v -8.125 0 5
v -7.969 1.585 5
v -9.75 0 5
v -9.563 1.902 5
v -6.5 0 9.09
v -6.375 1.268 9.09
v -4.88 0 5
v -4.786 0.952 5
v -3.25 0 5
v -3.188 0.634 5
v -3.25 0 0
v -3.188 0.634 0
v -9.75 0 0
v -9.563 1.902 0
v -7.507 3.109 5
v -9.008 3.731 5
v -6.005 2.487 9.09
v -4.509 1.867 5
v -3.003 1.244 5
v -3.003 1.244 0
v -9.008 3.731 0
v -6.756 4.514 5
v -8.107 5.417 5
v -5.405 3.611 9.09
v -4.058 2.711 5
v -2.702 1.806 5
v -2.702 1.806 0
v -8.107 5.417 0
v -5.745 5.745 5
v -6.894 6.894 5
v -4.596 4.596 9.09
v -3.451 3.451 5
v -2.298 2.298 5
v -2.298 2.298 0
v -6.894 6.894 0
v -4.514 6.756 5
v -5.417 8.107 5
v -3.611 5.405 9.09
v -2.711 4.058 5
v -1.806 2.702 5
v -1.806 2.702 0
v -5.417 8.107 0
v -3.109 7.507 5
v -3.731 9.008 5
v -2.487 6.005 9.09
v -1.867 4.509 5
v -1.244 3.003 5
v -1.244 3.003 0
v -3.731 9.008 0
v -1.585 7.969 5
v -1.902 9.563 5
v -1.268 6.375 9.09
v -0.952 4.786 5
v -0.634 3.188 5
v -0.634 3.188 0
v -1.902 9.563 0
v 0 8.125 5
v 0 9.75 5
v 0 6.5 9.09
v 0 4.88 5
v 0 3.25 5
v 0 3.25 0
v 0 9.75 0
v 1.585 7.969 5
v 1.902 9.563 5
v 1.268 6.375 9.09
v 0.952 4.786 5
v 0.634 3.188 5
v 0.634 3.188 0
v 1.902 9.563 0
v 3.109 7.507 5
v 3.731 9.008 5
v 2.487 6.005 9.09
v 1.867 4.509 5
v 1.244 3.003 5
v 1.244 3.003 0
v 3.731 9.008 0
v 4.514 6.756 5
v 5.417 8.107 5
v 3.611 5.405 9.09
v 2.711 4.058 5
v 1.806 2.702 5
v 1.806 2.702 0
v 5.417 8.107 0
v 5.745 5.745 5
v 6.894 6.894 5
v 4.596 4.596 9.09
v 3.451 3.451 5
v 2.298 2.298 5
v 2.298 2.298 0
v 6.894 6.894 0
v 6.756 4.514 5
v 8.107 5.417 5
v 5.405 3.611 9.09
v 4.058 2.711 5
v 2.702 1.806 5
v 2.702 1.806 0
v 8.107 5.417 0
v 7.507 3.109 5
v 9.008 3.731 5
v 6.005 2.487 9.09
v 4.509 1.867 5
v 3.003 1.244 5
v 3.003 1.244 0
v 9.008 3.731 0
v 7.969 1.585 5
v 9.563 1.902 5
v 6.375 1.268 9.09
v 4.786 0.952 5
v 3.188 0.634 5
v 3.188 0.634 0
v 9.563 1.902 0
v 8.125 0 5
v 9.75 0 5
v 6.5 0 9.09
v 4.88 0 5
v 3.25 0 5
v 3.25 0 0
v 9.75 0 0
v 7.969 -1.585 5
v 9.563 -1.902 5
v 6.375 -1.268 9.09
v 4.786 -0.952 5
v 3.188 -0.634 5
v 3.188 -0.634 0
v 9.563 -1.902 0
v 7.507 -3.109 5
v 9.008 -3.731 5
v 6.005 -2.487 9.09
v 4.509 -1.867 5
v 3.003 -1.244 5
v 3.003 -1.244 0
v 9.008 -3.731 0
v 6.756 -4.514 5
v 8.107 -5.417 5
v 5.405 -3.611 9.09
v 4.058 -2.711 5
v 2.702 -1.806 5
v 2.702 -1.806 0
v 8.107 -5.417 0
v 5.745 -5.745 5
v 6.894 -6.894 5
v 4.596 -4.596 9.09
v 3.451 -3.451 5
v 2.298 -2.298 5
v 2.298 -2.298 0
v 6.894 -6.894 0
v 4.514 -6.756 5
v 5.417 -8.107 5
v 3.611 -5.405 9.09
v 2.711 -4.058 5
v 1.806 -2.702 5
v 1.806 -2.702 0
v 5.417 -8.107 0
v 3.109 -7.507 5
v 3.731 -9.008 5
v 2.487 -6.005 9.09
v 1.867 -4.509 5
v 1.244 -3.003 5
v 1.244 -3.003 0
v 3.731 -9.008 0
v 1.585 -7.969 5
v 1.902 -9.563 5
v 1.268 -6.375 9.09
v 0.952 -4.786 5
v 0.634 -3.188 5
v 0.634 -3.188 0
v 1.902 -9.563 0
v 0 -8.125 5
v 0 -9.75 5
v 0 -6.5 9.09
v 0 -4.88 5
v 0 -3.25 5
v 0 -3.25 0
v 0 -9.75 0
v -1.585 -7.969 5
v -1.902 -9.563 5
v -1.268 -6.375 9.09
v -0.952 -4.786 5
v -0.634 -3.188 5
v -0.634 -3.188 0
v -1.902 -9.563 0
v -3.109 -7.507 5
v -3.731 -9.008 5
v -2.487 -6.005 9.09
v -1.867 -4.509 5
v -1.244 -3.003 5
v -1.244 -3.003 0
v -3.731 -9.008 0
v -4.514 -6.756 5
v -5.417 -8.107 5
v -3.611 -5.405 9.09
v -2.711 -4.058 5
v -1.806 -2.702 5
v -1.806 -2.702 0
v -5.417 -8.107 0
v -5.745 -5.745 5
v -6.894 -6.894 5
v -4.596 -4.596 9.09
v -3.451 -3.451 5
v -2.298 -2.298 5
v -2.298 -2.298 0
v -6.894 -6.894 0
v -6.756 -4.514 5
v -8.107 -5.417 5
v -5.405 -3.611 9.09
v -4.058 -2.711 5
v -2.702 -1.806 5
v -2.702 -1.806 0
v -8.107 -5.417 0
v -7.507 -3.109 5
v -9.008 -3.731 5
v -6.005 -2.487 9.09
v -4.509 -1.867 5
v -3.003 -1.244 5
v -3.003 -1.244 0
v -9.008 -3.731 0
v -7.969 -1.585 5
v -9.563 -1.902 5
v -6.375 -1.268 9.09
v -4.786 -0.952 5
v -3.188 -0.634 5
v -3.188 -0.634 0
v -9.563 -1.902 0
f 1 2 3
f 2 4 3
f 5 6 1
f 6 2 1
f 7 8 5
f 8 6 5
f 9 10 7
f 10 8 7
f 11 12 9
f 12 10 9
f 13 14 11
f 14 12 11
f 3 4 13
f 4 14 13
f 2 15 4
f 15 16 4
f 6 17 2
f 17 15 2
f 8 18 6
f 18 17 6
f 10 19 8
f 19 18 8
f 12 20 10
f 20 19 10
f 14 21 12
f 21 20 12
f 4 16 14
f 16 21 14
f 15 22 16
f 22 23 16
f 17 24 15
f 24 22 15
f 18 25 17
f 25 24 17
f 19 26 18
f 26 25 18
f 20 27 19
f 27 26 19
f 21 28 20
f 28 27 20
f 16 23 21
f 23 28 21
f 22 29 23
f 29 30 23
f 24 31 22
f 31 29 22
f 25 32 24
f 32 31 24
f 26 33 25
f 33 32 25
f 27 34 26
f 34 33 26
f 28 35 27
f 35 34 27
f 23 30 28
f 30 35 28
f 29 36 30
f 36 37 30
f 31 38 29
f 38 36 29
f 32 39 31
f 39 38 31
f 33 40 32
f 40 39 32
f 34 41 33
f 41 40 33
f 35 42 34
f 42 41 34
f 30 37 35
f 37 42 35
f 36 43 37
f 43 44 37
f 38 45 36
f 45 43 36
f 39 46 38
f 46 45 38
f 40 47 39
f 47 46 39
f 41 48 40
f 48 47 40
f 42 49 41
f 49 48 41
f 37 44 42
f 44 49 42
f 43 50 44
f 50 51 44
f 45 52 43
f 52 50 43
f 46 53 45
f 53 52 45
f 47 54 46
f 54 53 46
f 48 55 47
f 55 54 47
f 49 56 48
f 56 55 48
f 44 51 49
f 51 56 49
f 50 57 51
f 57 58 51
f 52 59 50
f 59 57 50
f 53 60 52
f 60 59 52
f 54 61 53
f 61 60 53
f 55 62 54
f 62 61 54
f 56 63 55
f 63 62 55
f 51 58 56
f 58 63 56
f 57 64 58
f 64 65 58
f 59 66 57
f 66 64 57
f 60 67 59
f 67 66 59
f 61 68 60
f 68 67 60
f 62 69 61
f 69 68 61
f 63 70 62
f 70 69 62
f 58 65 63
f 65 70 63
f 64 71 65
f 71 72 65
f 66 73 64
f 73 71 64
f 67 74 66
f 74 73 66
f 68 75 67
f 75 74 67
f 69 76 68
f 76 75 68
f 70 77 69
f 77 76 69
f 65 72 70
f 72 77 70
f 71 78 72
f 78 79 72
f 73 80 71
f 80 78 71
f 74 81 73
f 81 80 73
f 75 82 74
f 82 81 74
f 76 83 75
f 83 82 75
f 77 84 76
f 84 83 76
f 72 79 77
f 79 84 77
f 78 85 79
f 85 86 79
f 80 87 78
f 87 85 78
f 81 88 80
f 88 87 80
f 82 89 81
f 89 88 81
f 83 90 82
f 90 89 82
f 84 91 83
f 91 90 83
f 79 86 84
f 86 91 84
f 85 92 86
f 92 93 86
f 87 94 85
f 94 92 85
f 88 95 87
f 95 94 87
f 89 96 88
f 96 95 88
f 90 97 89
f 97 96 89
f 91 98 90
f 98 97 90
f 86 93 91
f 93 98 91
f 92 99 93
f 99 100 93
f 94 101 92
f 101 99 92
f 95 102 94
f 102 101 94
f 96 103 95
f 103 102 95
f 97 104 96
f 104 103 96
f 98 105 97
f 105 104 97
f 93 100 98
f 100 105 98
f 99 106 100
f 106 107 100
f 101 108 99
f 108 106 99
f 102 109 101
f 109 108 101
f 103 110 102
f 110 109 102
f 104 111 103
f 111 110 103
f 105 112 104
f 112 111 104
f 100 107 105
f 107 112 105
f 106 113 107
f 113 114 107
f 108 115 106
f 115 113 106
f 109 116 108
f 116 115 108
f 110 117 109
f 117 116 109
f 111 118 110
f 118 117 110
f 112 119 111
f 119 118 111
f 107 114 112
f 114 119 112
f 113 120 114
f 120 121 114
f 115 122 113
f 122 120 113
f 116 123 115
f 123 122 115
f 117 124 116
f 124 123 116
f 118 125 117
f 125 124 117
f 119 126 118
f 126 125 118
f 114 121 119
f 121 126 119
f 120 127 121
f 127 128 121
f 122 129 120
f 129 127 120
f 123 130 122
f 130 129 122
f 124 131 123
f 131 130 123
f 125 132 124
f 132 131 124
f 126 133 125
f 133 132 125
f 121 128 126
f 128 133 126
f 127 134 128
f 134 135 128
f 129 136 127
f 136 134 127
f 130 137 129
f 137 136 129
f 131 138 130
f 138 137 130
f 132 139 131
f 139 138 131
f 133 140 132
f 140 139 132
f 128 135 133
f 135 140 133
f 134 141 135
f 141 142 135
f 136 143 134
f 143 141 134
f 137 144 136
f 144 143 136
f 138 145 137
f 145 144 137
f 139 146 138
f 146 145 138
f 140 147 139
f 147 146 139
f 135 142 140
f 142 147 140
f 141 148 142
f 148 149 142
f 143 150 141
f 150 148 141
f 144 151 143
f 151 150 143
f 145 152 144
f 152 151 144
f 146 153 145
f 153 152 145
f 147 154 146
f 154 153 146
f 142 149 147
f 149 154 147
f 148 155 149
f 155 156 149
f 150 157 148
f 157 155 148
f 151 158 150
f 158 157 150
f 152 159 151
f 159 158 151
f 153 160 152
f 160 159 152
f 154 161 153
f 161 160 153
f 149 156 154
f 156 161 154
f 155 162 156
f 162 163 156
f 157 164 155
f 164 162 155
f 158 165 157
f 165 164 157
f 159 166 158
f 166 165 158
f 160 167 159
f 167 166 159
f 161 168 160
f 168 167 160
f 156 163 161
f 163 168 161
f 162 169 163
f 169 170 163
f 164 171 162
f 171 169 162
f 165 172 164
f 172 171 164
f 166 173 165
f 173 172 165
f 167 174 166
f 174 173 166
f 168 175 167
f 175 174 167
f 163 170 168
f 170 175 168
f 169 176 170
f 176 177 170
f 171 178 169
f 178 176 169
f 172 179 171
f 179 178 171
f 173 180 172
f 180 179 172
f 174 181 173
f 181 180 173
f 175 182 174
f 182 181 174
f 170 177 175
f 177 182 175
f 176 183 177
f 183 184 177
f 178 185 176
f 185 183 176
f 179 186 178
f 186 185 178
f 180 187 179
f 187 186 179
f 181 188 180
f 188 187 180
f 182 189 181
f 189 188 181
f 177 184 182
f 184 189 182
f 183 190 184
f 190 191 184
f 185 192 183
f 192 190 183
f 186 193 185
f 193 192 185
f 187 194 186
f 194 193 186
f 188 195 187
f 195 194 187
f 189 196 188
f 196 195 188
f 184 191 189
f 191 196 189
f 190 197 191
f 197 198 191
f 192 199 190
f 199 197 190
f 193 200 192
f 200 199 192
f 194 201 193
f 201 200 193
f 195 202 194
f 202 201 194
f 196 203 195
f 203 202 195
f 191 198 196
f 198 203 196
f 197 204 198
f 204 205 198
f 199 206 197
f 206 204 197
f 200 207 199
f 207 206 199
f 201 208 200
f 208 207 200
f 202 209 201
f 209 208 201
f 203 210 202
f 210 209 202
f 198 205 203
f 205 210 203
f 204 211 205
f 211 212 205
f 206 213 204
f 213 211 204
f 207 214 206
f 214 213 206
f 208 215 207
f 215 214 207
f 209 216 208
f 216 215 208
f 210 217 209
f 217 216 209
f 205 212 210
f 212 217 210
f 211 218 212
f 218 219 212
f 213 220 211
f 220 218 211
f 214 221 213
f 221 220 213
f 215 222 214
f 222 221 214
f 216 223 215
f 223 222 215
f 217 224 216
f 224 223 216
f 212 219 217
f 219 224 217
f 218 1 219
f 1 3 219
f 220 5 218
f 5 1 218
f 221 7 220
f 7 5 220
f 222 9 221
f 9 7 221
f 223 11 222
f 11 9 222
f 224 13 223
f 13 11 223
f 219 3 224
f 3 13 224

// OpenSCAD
$fn = 32;

// ----------------------------------------------------------------------
// Form washer: domed washer, 19.5 mm outside, 6.5 mm bore
// ----------------------------------------------------------------------

// --- parameters (mm) ---
revolve_angle = 360;      // full turn around the Z axis
profile_points = 7;       // points of the closed outline

profile = [[3.25, 0], [9.75, 0], [9.75, 5], [8.125, 5], [6.5, 9.09], [4.88, 5], [3.25, 5]];  // single closed polygon, 7 points, counter clockwise

// --- the one profile operation ---
rotate_extrude(angle = revolve_angle) polygon(points = profile);
